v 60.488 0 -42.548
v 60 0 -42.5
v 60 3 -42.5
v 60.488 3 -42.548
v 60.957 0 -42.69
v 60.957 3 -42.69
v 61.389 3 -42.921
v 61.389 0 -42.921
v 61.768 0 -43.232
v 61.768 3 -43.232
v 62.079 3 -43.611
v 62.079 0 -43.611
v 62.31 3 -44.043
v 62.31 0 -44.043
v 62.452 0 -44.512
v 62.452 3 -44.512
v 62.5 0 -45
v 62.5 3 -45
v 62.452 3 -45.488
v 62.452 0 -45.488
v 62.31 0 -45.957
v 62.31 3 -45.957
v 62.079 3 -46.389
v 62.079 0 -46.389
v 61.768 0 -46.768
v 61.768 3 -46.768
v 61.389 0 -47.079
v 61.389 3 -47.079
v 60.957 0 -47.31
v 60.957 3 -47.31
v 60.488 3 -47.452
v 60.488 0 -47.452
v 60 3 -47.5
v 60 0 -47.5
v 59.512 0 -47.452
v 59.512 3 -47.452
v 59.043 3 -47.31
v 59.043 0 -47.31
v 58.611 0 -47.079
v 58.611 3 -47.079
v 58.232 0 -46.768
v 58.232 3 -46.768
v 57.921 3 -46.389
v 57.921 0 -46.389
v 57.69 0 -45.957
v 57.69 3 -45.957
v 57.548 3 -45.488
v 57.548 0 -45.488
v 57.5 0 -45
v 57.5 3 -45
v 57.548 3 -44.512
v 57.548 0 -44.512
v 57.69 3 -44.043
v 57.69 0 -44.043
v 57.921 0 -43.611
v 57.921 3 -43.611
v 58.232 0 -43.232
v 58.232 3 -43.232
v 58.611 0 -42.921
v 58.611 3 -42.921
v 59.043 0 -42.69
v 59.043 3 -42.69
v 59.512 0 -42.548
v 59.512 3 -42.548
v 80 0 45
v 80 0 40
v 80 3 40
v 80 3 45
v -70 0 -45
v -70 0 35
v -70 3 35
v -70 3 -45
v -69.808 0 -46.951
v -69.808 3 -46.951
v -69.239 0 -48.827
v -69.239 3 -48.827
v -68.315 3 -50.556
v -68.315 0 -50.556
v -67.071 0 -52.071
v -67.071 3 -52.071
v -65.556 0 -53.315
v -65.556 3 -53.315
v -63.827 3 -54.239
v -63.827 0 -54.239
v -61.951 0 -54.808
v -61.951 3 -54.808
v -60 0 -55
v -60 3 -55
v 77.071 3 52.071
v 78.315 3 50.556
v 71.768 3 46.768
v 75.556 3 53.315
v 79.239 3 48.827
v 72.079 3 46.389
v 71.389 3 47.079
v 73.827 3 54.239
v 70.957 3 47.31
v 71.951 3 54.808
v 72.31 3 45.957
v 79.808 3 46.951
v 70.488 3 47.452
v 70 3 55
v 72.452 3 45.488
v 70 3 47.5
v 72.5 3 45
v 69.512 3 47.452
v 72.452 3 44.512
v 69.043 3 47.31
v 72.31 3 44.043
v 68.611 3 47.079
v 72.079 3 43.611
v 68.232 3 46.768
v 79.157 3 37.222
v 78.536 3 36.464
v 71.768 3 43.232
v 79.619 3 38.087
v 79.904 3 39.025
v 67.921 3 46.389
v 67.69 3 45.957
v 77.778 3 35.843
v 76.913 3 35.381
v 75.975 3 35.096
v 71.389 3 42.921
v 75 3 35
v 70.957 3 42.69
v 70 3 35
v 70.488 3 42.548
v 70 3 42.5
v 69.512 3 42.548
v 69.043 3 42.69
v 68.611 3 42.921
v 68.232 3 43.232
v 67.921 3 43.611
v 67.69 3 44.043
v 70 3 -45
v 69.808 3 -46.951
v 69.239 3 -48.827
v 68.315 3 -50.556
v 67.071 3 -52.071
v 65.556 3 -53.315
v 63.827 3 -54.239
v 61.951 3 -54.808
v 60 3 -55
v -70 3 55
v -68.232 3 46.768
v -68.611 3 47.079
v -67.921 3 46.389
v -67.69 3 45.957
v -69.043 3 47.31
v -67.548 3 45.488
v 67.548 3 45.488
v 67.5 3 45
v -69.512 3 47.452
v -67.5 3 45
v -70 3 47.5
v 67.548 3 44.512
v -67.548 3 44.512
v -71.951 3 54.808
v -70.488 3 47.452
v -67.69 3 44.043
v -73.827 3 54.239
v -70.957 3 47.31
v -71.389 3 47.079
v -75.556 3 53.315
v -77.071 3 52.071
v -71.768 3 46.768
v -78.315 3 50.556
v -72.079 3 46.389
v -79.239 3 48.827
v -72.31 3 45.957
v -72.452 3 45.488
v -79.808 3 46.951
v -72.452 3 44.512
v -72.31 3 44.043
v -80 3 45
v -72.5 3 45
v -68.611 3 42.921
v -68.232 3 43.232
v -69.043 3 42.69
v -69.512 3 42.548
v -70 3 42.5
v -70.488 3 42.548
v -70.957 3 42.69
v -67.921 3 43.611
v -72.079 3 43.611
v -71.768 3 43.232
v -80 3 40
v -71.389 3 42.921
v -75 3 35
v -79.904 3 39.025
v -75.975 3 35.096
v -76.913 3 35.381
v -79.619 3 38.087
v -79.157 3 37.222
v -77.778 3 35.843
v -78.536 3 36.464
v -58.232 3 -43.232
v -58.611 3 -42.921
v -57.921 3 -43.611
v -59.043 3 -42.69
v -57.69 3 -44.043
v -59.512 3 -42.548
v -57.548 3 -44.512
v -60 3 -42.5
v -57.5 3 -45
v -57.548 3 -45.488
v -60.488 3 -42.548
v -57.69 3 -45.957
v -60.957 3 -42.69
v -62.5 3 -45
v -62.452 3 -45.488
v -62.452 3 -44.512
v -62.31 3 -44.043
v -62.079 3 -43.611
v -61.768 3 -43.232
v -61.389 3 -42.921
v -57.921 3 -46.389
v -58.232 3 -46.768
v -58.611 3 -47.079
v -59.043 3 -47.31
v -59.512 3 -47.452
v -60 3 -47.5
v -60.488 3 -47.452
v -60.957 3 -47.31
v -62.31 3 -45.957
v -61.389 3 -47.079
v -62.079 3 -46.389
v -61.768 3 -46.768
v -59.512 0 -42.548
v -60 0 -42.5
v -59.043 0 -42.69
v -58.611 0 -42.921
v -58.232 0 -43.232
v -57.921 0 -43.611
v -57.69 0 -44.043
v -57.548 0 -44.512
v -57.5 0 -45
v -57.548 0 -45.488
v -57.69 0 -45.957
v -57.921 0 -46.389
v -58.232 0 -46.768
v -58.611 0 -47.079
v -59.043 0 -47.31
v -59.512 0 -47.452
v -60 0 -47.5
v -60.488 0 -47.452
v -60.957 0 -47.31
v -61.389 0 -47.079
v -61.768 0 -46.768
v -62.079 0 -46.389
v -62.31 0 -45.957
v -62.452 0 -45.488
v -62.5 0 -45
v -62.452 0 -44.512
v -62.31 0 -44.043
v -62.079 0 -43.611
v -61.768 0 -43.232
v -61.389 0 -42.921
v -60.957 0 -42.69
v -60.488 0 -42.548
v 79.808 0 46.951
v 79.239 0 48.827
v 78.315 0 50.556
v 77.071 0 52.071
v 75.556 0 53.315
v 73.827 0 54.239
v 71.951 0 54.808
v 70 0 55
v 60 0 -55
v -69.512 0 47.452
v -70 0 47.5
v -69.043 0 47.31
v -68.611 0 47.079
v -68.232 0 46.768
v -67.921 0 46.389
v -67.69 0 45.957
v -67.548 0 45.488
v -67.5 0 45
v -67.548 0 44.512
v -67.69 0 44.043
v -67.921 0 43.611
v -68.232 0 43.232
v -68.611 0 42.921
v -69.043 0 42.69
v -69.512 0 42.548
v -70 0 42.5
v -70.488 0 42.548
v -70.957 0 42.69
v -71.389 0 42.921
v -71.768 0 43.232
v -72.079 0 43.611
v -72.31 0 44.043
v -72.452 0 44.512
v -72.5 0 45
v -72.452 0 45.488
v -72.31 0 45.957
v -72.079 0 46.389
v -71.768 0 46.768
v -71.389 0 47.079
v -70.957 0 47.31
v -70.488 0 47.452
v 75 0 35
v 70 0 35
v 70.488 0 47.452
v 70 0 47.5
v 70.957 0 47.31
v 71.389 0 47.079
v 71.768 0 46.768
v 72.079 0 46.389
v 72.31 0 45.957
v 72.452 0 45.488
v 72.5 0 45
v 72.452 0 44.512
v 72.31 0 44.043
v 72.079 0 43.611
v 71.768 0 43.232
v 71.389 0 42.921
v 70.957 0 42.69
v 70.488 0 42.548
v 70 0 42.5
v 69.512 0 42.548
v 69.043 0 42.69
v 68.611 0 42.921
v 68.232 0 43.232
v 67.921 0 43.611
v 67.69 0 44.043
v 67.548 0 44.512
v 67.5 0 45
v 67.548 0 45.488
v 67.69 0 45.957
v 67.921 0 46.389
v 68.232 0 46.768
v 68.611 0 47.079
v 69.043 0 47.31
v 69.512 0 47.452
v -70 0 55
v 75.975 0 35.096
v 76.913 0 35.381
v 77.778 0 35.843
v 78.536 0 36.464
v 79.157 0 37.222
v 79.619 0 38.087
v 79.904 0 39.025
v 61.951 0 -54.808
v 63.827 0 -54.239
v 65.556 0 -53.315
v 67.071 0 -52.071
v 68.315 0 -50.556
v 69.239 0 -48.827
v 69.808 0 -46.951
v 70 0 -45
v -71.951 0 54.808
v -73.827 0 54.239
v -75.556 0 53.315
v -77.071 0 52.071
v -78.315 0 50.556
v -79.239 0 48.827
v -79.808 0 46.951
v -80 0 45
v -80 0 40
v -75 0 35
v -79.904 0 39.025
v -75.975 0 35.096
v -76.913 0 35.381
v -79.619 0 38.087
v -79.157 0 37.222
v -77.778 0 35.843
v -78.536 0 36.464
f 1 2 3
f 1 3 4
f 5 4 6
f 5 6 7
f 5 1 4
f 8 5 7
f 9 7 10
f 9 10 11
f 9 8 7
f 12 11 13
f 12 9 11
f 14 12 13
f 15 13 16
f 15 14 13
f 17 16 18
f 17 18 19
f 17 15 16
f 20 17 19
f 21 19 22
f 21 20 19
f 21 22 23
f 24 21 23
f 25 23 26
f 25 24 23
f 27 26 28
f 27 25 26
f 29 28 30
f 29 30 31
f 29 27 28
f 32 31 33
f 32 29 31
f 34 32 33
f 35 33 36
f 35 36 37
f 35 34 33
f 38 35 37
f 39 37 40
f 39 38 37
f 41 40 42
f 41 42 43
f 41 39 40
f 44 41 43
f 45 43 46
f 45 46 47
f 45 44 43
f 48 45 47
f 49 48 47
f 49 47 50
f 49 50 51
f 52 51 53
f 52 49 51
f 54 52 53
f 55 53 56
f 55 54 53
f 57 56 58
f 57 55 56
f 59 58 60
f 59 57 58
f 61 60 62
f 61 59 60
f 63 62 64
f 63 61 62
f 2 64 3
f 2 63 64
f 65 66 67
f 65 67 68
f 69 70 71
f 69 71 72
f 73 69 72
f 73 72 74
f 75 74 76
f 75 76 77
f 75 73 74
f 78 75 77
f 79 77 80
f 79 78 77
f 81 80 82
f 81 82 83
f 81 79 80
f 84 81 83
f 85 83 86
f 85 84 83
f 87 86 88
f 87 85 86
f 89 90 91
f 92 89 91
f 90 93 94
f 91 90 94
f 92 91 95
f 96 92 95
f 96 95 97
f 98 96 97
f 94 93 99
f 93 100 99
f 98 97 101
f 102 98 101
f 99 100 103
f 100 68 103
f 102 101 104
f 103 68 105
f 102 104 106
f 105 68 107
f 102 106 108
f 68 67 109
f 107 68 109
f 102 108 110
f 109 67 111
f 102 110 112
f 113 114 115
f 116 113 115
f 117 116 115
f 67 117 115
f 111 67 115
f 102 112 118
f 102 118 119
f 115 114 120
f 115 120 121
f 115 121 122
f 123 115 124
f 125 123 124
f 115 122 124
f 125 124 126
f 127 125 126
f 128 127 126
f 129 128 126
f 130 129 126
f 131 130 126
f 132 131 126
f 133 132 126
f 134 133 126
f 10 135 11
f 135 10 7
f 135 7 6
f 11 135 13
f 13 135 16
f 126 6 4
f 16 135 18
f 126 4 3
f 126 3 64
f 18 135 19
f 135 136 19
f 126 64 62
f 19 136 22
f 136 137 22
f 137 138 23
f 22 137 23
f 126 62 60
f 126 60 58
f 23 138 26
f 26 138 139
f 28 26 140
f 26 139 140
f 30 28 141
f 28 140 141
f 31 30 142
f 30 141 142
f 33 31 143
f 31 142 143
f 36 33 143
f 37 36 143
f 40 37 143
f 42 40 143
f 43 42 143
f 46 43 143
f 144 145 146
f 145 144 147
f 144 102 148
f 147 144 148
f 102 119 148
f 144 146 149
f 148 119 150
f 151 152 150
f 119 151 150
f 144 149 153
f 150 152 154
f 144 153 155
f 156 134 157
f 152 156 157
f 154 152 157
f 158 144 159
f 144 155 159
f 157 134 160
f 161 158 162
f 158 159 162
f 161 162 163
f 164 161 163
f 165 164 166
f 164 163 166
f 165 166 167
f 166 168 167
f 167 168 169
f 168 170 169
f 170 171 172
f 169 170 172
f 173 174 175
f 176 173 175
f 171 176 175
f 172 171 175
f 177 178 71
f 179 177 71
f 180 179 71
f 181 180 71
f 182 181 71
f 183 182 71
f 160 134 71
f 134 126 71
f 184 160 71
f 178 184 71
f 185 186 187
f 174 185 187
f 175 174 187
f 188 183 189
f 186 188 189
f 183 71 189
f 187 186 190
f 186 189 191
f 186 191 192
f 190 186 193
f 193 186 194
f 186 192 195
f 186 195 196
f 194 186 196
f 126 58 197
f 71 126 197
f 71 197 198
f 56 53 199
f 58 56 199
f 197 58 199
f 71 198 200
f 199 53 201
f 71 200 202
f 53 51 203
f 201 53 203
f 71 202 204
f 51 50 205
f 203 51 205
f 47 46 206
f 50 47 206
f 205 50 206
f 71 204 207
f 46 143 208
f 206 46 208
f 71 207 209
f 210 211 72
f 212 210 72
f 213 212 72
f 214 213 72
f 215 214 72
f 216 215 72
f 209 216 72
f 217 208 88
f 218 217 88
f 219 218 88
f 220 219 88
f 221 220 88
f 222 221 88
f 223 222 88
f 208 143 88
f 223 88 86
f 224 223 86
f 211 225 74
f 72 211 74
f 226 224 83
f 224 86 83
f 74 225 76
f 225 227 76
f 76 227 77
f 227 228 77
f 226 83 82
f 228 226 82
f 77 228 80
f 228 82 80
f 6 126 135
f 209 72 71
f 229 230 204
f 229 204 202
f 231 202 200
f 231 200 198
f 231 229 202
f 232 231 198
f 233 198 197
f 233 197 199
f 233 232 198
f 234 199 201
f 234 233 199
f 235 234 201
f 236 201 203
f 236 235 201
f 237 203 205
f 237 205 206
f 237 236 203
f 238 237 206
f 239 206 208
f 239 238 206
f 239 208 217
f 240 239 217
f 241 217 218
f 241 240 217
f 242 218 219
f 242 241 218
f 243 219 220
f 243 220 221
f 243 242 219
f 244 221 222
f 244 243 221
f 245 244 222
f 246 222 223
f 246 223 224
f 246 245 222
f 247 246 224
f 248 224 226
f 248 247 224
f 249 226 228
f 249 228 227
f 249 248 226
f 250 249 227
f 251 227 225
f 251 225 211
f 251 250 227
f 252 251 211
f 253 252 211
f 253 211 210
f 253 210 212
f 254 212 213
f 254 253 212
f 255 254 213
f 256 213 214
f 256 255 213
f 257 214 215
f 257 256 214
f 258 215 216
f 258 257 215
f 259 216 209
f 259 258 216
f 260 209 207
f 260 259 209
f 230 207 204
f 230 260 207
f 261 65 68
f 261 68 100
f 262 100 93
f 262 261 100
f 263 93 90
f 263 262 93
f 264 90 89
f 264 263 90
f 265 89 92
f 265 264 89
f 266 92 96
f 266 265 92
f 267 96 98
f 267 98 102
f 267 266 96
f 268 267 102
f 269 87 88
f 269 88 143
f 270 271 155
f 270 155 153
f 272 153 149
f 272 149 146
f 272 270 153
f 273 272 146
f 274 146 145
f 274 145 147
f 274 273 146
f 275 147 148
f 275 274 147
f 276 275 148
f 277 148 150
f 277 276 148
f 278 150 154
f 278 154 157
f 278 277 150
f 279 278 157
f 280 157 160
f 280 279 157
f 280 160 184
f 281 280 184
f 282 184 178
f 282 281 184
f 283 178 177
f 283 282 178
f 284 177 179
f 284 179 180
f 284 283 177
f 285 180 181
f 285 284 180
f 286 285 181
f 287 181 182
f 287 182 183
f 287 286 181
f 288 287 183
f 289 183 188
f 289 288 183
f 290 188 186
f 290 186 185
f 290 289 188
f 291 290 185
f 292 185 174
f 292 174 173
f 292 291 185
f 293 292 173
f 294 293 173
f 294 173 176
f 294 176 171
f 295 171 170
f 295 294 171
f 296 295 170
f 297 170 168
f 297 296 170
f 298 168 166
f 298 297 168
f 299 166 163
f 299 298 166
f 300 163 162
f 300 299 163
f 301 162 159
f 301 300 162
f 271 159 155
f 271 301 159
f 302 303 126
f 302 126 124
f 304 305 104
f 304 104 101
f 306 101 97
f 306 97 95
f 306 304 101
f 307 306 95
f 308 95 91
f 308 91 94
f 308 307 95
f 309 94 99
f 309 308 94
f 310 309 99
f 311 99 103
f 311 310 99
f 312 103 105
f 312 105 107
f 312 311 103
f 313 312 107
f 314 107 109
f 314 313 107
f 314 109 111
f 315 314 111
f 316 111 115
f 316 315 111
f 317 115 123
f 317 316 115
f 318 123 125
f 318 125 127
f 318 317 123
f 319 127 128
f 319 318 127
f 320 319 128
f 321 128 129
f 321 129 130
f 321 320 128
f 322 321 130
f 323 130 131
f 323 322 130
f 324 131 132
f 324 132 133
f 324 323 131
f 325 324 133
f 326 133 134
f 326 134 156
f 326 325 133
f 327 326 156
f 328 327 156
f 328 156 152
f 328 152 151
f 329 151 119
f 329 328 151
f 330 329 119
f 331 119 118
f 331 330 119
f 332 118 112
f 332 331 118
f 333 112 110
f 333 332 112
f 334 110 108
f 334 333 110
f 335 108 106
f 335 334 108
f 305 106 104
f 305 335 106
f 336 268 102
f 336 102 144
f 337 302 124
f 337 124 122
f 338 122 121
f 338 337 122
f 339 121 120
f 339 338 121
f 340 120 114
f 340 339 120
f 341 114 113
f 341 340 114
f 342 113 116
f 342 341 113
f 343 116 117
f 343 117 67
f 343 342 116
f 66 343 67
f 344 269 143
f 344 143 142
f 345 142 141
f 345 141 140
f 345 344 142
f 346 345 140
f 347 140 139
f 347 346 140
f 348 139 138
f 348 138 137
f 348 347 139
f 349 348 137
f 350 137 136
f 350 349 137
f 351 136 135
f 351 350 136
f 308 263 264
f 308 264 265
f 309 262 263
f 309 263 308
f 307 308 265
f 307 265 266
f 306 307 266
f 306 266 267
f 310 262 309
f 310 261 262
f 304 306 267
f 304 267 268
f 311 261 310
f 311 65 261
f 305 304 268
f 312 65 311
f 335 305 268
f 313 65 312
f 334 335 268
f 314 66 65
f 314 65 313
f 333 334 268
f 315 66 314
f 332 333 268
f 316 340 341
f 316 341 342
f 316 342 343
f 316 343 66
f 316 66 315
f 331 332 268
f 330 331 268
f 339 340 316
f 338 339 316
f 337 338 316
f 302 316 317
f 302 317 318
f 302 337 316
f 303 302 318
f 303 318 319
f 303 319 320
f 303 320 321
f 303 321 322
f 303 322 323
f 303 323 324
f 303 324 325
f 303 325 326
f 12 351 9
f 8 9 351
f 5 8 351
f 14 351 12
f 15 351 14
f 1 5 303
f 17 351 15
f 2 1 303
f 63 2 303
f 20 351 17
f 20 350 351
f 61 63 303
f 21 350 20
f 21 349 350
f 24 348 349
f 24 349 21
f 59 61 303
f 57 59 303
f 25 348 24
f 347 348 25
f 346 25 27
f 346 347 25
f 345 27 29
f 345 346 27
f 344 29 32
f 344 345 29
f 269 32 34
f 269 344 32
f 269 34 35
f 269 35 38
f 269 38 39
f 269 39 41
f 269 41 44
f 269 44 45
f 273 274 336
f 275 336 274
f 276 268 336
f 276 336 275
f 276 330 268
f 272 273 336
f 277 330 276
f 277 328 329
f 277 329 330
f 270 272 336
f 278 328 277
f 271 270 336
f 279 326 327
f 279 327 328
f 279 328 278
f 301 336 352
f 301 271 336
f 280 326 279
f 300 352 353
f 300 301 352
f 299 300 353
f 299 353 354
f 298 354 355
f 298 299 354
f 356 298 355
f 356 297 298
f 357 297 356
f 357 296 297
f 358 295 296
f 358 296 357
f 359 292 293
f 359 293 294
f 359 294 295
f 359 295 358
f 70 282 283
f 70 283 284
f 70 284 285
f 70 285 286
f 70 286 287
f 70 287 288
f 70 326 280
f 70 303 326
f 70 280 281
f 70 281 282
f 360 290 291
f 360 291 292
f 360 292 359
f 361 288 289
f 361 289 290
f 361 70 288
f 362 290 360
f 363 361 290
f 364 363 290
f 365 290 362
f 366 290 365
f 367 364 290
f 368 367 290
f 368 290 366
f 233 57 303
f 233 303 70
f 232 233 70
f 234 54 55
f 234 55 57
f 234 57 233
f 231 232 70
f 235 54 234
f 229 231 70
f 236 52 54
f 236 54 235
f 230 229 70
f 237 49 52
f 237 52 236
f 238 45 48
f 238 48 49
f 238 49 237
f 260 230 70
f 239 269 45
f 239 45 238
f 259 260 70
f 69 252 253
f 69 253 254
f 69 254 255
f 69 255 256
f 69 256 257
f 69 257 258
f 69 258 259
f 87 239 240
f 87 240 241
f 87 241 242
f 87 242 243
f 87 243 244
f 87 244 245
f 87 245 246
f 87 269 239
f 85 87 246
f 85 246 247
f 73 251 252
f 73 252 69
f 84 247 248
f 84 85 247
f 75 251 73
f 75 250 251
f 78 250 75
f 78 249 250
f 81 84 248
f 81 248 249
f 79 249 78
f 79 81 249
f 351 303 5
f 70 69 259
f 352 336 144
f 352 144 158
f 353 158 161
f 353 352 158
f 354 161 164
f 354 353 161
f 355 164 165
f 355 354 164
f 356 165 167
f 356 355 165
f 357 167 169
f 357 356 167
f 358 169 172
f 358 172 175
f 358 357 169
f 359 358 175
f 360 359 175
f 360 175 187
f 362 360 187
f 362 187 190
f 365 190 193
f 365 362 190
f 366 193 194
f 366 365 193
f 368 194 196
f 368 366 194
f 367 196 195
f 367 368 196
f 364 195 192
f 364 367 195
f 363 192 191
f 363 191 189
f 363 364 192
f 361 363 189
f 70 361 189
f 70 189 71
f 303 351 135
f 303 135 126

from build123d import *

# Parameters (mm, degrees)
CROQUIS1_R              = 2.5
SALIENTE_EXTRUIR1_DEPTH = 3


with BuildPart() as part:
    # Croquis1 → Saliente-Extruir1 (new body)
    with BuildSketch(Plane(origin=(0, 0, 0), x_dir=(1, 0, 0), z_dir=(0, 1, 0))):
        with BuildLine():
            Line((-60, 55), (60, 55))
            ThreePointArc((60, 55), (67.071067812, 52.071067812), (70, 45))
            Line((70, 45), (70, -35))
            Line((70, -35), (75, -35))
            ThreePointArc((75, -35), (78.535533906, -36.464466094), (80, -40))
            Line((80, -40), (80, -45))
            ThreePointArc((80, -45), (77.071067812, -52.071067812), (70, -55))
            Line((70, -55), (-70, -55))
            ThreePointArc((-70, -55), (-77.071067812, -52.071067812), (-80, -45))
            Line((-80, -45), (-80, -40))
            ThreePointArc((-80, -40), (-78.535533906, -36.464466094), (-75, -35))
            Line((-75, -35), (-70, -35))
            Line((-70, -35), (-70, 45))
            ThreePointArc((-70, 45), (-67.071067812, 52.071067812), (-60, 55))
        make_face()
        with Locations(Location((-60, 45, 0), (0, 0, 270))):
            Circle(CROQUIS1_R, mode=Mode.SUBTRACT)
        with Locations(Location((60, 45, 0), (0, 0, 270))):
            Circle(CROQUIS1_R, mode=Mode.SUBTRACT)
        with Locations(Location((-70, -45, 0), (0, 0, 270))):
            Circle(CROQUIS1_R, mode=Mode.SUBTRACT)
        with Locations(Location((70, -45, 0), (0, 0, 270))):
            Circle(CROQUIS1_R, mode=Mode.SUBTRACT)
    extrude(amount=SALIENTE_EXTRUIR1_DEPTH)


solid = part.part
